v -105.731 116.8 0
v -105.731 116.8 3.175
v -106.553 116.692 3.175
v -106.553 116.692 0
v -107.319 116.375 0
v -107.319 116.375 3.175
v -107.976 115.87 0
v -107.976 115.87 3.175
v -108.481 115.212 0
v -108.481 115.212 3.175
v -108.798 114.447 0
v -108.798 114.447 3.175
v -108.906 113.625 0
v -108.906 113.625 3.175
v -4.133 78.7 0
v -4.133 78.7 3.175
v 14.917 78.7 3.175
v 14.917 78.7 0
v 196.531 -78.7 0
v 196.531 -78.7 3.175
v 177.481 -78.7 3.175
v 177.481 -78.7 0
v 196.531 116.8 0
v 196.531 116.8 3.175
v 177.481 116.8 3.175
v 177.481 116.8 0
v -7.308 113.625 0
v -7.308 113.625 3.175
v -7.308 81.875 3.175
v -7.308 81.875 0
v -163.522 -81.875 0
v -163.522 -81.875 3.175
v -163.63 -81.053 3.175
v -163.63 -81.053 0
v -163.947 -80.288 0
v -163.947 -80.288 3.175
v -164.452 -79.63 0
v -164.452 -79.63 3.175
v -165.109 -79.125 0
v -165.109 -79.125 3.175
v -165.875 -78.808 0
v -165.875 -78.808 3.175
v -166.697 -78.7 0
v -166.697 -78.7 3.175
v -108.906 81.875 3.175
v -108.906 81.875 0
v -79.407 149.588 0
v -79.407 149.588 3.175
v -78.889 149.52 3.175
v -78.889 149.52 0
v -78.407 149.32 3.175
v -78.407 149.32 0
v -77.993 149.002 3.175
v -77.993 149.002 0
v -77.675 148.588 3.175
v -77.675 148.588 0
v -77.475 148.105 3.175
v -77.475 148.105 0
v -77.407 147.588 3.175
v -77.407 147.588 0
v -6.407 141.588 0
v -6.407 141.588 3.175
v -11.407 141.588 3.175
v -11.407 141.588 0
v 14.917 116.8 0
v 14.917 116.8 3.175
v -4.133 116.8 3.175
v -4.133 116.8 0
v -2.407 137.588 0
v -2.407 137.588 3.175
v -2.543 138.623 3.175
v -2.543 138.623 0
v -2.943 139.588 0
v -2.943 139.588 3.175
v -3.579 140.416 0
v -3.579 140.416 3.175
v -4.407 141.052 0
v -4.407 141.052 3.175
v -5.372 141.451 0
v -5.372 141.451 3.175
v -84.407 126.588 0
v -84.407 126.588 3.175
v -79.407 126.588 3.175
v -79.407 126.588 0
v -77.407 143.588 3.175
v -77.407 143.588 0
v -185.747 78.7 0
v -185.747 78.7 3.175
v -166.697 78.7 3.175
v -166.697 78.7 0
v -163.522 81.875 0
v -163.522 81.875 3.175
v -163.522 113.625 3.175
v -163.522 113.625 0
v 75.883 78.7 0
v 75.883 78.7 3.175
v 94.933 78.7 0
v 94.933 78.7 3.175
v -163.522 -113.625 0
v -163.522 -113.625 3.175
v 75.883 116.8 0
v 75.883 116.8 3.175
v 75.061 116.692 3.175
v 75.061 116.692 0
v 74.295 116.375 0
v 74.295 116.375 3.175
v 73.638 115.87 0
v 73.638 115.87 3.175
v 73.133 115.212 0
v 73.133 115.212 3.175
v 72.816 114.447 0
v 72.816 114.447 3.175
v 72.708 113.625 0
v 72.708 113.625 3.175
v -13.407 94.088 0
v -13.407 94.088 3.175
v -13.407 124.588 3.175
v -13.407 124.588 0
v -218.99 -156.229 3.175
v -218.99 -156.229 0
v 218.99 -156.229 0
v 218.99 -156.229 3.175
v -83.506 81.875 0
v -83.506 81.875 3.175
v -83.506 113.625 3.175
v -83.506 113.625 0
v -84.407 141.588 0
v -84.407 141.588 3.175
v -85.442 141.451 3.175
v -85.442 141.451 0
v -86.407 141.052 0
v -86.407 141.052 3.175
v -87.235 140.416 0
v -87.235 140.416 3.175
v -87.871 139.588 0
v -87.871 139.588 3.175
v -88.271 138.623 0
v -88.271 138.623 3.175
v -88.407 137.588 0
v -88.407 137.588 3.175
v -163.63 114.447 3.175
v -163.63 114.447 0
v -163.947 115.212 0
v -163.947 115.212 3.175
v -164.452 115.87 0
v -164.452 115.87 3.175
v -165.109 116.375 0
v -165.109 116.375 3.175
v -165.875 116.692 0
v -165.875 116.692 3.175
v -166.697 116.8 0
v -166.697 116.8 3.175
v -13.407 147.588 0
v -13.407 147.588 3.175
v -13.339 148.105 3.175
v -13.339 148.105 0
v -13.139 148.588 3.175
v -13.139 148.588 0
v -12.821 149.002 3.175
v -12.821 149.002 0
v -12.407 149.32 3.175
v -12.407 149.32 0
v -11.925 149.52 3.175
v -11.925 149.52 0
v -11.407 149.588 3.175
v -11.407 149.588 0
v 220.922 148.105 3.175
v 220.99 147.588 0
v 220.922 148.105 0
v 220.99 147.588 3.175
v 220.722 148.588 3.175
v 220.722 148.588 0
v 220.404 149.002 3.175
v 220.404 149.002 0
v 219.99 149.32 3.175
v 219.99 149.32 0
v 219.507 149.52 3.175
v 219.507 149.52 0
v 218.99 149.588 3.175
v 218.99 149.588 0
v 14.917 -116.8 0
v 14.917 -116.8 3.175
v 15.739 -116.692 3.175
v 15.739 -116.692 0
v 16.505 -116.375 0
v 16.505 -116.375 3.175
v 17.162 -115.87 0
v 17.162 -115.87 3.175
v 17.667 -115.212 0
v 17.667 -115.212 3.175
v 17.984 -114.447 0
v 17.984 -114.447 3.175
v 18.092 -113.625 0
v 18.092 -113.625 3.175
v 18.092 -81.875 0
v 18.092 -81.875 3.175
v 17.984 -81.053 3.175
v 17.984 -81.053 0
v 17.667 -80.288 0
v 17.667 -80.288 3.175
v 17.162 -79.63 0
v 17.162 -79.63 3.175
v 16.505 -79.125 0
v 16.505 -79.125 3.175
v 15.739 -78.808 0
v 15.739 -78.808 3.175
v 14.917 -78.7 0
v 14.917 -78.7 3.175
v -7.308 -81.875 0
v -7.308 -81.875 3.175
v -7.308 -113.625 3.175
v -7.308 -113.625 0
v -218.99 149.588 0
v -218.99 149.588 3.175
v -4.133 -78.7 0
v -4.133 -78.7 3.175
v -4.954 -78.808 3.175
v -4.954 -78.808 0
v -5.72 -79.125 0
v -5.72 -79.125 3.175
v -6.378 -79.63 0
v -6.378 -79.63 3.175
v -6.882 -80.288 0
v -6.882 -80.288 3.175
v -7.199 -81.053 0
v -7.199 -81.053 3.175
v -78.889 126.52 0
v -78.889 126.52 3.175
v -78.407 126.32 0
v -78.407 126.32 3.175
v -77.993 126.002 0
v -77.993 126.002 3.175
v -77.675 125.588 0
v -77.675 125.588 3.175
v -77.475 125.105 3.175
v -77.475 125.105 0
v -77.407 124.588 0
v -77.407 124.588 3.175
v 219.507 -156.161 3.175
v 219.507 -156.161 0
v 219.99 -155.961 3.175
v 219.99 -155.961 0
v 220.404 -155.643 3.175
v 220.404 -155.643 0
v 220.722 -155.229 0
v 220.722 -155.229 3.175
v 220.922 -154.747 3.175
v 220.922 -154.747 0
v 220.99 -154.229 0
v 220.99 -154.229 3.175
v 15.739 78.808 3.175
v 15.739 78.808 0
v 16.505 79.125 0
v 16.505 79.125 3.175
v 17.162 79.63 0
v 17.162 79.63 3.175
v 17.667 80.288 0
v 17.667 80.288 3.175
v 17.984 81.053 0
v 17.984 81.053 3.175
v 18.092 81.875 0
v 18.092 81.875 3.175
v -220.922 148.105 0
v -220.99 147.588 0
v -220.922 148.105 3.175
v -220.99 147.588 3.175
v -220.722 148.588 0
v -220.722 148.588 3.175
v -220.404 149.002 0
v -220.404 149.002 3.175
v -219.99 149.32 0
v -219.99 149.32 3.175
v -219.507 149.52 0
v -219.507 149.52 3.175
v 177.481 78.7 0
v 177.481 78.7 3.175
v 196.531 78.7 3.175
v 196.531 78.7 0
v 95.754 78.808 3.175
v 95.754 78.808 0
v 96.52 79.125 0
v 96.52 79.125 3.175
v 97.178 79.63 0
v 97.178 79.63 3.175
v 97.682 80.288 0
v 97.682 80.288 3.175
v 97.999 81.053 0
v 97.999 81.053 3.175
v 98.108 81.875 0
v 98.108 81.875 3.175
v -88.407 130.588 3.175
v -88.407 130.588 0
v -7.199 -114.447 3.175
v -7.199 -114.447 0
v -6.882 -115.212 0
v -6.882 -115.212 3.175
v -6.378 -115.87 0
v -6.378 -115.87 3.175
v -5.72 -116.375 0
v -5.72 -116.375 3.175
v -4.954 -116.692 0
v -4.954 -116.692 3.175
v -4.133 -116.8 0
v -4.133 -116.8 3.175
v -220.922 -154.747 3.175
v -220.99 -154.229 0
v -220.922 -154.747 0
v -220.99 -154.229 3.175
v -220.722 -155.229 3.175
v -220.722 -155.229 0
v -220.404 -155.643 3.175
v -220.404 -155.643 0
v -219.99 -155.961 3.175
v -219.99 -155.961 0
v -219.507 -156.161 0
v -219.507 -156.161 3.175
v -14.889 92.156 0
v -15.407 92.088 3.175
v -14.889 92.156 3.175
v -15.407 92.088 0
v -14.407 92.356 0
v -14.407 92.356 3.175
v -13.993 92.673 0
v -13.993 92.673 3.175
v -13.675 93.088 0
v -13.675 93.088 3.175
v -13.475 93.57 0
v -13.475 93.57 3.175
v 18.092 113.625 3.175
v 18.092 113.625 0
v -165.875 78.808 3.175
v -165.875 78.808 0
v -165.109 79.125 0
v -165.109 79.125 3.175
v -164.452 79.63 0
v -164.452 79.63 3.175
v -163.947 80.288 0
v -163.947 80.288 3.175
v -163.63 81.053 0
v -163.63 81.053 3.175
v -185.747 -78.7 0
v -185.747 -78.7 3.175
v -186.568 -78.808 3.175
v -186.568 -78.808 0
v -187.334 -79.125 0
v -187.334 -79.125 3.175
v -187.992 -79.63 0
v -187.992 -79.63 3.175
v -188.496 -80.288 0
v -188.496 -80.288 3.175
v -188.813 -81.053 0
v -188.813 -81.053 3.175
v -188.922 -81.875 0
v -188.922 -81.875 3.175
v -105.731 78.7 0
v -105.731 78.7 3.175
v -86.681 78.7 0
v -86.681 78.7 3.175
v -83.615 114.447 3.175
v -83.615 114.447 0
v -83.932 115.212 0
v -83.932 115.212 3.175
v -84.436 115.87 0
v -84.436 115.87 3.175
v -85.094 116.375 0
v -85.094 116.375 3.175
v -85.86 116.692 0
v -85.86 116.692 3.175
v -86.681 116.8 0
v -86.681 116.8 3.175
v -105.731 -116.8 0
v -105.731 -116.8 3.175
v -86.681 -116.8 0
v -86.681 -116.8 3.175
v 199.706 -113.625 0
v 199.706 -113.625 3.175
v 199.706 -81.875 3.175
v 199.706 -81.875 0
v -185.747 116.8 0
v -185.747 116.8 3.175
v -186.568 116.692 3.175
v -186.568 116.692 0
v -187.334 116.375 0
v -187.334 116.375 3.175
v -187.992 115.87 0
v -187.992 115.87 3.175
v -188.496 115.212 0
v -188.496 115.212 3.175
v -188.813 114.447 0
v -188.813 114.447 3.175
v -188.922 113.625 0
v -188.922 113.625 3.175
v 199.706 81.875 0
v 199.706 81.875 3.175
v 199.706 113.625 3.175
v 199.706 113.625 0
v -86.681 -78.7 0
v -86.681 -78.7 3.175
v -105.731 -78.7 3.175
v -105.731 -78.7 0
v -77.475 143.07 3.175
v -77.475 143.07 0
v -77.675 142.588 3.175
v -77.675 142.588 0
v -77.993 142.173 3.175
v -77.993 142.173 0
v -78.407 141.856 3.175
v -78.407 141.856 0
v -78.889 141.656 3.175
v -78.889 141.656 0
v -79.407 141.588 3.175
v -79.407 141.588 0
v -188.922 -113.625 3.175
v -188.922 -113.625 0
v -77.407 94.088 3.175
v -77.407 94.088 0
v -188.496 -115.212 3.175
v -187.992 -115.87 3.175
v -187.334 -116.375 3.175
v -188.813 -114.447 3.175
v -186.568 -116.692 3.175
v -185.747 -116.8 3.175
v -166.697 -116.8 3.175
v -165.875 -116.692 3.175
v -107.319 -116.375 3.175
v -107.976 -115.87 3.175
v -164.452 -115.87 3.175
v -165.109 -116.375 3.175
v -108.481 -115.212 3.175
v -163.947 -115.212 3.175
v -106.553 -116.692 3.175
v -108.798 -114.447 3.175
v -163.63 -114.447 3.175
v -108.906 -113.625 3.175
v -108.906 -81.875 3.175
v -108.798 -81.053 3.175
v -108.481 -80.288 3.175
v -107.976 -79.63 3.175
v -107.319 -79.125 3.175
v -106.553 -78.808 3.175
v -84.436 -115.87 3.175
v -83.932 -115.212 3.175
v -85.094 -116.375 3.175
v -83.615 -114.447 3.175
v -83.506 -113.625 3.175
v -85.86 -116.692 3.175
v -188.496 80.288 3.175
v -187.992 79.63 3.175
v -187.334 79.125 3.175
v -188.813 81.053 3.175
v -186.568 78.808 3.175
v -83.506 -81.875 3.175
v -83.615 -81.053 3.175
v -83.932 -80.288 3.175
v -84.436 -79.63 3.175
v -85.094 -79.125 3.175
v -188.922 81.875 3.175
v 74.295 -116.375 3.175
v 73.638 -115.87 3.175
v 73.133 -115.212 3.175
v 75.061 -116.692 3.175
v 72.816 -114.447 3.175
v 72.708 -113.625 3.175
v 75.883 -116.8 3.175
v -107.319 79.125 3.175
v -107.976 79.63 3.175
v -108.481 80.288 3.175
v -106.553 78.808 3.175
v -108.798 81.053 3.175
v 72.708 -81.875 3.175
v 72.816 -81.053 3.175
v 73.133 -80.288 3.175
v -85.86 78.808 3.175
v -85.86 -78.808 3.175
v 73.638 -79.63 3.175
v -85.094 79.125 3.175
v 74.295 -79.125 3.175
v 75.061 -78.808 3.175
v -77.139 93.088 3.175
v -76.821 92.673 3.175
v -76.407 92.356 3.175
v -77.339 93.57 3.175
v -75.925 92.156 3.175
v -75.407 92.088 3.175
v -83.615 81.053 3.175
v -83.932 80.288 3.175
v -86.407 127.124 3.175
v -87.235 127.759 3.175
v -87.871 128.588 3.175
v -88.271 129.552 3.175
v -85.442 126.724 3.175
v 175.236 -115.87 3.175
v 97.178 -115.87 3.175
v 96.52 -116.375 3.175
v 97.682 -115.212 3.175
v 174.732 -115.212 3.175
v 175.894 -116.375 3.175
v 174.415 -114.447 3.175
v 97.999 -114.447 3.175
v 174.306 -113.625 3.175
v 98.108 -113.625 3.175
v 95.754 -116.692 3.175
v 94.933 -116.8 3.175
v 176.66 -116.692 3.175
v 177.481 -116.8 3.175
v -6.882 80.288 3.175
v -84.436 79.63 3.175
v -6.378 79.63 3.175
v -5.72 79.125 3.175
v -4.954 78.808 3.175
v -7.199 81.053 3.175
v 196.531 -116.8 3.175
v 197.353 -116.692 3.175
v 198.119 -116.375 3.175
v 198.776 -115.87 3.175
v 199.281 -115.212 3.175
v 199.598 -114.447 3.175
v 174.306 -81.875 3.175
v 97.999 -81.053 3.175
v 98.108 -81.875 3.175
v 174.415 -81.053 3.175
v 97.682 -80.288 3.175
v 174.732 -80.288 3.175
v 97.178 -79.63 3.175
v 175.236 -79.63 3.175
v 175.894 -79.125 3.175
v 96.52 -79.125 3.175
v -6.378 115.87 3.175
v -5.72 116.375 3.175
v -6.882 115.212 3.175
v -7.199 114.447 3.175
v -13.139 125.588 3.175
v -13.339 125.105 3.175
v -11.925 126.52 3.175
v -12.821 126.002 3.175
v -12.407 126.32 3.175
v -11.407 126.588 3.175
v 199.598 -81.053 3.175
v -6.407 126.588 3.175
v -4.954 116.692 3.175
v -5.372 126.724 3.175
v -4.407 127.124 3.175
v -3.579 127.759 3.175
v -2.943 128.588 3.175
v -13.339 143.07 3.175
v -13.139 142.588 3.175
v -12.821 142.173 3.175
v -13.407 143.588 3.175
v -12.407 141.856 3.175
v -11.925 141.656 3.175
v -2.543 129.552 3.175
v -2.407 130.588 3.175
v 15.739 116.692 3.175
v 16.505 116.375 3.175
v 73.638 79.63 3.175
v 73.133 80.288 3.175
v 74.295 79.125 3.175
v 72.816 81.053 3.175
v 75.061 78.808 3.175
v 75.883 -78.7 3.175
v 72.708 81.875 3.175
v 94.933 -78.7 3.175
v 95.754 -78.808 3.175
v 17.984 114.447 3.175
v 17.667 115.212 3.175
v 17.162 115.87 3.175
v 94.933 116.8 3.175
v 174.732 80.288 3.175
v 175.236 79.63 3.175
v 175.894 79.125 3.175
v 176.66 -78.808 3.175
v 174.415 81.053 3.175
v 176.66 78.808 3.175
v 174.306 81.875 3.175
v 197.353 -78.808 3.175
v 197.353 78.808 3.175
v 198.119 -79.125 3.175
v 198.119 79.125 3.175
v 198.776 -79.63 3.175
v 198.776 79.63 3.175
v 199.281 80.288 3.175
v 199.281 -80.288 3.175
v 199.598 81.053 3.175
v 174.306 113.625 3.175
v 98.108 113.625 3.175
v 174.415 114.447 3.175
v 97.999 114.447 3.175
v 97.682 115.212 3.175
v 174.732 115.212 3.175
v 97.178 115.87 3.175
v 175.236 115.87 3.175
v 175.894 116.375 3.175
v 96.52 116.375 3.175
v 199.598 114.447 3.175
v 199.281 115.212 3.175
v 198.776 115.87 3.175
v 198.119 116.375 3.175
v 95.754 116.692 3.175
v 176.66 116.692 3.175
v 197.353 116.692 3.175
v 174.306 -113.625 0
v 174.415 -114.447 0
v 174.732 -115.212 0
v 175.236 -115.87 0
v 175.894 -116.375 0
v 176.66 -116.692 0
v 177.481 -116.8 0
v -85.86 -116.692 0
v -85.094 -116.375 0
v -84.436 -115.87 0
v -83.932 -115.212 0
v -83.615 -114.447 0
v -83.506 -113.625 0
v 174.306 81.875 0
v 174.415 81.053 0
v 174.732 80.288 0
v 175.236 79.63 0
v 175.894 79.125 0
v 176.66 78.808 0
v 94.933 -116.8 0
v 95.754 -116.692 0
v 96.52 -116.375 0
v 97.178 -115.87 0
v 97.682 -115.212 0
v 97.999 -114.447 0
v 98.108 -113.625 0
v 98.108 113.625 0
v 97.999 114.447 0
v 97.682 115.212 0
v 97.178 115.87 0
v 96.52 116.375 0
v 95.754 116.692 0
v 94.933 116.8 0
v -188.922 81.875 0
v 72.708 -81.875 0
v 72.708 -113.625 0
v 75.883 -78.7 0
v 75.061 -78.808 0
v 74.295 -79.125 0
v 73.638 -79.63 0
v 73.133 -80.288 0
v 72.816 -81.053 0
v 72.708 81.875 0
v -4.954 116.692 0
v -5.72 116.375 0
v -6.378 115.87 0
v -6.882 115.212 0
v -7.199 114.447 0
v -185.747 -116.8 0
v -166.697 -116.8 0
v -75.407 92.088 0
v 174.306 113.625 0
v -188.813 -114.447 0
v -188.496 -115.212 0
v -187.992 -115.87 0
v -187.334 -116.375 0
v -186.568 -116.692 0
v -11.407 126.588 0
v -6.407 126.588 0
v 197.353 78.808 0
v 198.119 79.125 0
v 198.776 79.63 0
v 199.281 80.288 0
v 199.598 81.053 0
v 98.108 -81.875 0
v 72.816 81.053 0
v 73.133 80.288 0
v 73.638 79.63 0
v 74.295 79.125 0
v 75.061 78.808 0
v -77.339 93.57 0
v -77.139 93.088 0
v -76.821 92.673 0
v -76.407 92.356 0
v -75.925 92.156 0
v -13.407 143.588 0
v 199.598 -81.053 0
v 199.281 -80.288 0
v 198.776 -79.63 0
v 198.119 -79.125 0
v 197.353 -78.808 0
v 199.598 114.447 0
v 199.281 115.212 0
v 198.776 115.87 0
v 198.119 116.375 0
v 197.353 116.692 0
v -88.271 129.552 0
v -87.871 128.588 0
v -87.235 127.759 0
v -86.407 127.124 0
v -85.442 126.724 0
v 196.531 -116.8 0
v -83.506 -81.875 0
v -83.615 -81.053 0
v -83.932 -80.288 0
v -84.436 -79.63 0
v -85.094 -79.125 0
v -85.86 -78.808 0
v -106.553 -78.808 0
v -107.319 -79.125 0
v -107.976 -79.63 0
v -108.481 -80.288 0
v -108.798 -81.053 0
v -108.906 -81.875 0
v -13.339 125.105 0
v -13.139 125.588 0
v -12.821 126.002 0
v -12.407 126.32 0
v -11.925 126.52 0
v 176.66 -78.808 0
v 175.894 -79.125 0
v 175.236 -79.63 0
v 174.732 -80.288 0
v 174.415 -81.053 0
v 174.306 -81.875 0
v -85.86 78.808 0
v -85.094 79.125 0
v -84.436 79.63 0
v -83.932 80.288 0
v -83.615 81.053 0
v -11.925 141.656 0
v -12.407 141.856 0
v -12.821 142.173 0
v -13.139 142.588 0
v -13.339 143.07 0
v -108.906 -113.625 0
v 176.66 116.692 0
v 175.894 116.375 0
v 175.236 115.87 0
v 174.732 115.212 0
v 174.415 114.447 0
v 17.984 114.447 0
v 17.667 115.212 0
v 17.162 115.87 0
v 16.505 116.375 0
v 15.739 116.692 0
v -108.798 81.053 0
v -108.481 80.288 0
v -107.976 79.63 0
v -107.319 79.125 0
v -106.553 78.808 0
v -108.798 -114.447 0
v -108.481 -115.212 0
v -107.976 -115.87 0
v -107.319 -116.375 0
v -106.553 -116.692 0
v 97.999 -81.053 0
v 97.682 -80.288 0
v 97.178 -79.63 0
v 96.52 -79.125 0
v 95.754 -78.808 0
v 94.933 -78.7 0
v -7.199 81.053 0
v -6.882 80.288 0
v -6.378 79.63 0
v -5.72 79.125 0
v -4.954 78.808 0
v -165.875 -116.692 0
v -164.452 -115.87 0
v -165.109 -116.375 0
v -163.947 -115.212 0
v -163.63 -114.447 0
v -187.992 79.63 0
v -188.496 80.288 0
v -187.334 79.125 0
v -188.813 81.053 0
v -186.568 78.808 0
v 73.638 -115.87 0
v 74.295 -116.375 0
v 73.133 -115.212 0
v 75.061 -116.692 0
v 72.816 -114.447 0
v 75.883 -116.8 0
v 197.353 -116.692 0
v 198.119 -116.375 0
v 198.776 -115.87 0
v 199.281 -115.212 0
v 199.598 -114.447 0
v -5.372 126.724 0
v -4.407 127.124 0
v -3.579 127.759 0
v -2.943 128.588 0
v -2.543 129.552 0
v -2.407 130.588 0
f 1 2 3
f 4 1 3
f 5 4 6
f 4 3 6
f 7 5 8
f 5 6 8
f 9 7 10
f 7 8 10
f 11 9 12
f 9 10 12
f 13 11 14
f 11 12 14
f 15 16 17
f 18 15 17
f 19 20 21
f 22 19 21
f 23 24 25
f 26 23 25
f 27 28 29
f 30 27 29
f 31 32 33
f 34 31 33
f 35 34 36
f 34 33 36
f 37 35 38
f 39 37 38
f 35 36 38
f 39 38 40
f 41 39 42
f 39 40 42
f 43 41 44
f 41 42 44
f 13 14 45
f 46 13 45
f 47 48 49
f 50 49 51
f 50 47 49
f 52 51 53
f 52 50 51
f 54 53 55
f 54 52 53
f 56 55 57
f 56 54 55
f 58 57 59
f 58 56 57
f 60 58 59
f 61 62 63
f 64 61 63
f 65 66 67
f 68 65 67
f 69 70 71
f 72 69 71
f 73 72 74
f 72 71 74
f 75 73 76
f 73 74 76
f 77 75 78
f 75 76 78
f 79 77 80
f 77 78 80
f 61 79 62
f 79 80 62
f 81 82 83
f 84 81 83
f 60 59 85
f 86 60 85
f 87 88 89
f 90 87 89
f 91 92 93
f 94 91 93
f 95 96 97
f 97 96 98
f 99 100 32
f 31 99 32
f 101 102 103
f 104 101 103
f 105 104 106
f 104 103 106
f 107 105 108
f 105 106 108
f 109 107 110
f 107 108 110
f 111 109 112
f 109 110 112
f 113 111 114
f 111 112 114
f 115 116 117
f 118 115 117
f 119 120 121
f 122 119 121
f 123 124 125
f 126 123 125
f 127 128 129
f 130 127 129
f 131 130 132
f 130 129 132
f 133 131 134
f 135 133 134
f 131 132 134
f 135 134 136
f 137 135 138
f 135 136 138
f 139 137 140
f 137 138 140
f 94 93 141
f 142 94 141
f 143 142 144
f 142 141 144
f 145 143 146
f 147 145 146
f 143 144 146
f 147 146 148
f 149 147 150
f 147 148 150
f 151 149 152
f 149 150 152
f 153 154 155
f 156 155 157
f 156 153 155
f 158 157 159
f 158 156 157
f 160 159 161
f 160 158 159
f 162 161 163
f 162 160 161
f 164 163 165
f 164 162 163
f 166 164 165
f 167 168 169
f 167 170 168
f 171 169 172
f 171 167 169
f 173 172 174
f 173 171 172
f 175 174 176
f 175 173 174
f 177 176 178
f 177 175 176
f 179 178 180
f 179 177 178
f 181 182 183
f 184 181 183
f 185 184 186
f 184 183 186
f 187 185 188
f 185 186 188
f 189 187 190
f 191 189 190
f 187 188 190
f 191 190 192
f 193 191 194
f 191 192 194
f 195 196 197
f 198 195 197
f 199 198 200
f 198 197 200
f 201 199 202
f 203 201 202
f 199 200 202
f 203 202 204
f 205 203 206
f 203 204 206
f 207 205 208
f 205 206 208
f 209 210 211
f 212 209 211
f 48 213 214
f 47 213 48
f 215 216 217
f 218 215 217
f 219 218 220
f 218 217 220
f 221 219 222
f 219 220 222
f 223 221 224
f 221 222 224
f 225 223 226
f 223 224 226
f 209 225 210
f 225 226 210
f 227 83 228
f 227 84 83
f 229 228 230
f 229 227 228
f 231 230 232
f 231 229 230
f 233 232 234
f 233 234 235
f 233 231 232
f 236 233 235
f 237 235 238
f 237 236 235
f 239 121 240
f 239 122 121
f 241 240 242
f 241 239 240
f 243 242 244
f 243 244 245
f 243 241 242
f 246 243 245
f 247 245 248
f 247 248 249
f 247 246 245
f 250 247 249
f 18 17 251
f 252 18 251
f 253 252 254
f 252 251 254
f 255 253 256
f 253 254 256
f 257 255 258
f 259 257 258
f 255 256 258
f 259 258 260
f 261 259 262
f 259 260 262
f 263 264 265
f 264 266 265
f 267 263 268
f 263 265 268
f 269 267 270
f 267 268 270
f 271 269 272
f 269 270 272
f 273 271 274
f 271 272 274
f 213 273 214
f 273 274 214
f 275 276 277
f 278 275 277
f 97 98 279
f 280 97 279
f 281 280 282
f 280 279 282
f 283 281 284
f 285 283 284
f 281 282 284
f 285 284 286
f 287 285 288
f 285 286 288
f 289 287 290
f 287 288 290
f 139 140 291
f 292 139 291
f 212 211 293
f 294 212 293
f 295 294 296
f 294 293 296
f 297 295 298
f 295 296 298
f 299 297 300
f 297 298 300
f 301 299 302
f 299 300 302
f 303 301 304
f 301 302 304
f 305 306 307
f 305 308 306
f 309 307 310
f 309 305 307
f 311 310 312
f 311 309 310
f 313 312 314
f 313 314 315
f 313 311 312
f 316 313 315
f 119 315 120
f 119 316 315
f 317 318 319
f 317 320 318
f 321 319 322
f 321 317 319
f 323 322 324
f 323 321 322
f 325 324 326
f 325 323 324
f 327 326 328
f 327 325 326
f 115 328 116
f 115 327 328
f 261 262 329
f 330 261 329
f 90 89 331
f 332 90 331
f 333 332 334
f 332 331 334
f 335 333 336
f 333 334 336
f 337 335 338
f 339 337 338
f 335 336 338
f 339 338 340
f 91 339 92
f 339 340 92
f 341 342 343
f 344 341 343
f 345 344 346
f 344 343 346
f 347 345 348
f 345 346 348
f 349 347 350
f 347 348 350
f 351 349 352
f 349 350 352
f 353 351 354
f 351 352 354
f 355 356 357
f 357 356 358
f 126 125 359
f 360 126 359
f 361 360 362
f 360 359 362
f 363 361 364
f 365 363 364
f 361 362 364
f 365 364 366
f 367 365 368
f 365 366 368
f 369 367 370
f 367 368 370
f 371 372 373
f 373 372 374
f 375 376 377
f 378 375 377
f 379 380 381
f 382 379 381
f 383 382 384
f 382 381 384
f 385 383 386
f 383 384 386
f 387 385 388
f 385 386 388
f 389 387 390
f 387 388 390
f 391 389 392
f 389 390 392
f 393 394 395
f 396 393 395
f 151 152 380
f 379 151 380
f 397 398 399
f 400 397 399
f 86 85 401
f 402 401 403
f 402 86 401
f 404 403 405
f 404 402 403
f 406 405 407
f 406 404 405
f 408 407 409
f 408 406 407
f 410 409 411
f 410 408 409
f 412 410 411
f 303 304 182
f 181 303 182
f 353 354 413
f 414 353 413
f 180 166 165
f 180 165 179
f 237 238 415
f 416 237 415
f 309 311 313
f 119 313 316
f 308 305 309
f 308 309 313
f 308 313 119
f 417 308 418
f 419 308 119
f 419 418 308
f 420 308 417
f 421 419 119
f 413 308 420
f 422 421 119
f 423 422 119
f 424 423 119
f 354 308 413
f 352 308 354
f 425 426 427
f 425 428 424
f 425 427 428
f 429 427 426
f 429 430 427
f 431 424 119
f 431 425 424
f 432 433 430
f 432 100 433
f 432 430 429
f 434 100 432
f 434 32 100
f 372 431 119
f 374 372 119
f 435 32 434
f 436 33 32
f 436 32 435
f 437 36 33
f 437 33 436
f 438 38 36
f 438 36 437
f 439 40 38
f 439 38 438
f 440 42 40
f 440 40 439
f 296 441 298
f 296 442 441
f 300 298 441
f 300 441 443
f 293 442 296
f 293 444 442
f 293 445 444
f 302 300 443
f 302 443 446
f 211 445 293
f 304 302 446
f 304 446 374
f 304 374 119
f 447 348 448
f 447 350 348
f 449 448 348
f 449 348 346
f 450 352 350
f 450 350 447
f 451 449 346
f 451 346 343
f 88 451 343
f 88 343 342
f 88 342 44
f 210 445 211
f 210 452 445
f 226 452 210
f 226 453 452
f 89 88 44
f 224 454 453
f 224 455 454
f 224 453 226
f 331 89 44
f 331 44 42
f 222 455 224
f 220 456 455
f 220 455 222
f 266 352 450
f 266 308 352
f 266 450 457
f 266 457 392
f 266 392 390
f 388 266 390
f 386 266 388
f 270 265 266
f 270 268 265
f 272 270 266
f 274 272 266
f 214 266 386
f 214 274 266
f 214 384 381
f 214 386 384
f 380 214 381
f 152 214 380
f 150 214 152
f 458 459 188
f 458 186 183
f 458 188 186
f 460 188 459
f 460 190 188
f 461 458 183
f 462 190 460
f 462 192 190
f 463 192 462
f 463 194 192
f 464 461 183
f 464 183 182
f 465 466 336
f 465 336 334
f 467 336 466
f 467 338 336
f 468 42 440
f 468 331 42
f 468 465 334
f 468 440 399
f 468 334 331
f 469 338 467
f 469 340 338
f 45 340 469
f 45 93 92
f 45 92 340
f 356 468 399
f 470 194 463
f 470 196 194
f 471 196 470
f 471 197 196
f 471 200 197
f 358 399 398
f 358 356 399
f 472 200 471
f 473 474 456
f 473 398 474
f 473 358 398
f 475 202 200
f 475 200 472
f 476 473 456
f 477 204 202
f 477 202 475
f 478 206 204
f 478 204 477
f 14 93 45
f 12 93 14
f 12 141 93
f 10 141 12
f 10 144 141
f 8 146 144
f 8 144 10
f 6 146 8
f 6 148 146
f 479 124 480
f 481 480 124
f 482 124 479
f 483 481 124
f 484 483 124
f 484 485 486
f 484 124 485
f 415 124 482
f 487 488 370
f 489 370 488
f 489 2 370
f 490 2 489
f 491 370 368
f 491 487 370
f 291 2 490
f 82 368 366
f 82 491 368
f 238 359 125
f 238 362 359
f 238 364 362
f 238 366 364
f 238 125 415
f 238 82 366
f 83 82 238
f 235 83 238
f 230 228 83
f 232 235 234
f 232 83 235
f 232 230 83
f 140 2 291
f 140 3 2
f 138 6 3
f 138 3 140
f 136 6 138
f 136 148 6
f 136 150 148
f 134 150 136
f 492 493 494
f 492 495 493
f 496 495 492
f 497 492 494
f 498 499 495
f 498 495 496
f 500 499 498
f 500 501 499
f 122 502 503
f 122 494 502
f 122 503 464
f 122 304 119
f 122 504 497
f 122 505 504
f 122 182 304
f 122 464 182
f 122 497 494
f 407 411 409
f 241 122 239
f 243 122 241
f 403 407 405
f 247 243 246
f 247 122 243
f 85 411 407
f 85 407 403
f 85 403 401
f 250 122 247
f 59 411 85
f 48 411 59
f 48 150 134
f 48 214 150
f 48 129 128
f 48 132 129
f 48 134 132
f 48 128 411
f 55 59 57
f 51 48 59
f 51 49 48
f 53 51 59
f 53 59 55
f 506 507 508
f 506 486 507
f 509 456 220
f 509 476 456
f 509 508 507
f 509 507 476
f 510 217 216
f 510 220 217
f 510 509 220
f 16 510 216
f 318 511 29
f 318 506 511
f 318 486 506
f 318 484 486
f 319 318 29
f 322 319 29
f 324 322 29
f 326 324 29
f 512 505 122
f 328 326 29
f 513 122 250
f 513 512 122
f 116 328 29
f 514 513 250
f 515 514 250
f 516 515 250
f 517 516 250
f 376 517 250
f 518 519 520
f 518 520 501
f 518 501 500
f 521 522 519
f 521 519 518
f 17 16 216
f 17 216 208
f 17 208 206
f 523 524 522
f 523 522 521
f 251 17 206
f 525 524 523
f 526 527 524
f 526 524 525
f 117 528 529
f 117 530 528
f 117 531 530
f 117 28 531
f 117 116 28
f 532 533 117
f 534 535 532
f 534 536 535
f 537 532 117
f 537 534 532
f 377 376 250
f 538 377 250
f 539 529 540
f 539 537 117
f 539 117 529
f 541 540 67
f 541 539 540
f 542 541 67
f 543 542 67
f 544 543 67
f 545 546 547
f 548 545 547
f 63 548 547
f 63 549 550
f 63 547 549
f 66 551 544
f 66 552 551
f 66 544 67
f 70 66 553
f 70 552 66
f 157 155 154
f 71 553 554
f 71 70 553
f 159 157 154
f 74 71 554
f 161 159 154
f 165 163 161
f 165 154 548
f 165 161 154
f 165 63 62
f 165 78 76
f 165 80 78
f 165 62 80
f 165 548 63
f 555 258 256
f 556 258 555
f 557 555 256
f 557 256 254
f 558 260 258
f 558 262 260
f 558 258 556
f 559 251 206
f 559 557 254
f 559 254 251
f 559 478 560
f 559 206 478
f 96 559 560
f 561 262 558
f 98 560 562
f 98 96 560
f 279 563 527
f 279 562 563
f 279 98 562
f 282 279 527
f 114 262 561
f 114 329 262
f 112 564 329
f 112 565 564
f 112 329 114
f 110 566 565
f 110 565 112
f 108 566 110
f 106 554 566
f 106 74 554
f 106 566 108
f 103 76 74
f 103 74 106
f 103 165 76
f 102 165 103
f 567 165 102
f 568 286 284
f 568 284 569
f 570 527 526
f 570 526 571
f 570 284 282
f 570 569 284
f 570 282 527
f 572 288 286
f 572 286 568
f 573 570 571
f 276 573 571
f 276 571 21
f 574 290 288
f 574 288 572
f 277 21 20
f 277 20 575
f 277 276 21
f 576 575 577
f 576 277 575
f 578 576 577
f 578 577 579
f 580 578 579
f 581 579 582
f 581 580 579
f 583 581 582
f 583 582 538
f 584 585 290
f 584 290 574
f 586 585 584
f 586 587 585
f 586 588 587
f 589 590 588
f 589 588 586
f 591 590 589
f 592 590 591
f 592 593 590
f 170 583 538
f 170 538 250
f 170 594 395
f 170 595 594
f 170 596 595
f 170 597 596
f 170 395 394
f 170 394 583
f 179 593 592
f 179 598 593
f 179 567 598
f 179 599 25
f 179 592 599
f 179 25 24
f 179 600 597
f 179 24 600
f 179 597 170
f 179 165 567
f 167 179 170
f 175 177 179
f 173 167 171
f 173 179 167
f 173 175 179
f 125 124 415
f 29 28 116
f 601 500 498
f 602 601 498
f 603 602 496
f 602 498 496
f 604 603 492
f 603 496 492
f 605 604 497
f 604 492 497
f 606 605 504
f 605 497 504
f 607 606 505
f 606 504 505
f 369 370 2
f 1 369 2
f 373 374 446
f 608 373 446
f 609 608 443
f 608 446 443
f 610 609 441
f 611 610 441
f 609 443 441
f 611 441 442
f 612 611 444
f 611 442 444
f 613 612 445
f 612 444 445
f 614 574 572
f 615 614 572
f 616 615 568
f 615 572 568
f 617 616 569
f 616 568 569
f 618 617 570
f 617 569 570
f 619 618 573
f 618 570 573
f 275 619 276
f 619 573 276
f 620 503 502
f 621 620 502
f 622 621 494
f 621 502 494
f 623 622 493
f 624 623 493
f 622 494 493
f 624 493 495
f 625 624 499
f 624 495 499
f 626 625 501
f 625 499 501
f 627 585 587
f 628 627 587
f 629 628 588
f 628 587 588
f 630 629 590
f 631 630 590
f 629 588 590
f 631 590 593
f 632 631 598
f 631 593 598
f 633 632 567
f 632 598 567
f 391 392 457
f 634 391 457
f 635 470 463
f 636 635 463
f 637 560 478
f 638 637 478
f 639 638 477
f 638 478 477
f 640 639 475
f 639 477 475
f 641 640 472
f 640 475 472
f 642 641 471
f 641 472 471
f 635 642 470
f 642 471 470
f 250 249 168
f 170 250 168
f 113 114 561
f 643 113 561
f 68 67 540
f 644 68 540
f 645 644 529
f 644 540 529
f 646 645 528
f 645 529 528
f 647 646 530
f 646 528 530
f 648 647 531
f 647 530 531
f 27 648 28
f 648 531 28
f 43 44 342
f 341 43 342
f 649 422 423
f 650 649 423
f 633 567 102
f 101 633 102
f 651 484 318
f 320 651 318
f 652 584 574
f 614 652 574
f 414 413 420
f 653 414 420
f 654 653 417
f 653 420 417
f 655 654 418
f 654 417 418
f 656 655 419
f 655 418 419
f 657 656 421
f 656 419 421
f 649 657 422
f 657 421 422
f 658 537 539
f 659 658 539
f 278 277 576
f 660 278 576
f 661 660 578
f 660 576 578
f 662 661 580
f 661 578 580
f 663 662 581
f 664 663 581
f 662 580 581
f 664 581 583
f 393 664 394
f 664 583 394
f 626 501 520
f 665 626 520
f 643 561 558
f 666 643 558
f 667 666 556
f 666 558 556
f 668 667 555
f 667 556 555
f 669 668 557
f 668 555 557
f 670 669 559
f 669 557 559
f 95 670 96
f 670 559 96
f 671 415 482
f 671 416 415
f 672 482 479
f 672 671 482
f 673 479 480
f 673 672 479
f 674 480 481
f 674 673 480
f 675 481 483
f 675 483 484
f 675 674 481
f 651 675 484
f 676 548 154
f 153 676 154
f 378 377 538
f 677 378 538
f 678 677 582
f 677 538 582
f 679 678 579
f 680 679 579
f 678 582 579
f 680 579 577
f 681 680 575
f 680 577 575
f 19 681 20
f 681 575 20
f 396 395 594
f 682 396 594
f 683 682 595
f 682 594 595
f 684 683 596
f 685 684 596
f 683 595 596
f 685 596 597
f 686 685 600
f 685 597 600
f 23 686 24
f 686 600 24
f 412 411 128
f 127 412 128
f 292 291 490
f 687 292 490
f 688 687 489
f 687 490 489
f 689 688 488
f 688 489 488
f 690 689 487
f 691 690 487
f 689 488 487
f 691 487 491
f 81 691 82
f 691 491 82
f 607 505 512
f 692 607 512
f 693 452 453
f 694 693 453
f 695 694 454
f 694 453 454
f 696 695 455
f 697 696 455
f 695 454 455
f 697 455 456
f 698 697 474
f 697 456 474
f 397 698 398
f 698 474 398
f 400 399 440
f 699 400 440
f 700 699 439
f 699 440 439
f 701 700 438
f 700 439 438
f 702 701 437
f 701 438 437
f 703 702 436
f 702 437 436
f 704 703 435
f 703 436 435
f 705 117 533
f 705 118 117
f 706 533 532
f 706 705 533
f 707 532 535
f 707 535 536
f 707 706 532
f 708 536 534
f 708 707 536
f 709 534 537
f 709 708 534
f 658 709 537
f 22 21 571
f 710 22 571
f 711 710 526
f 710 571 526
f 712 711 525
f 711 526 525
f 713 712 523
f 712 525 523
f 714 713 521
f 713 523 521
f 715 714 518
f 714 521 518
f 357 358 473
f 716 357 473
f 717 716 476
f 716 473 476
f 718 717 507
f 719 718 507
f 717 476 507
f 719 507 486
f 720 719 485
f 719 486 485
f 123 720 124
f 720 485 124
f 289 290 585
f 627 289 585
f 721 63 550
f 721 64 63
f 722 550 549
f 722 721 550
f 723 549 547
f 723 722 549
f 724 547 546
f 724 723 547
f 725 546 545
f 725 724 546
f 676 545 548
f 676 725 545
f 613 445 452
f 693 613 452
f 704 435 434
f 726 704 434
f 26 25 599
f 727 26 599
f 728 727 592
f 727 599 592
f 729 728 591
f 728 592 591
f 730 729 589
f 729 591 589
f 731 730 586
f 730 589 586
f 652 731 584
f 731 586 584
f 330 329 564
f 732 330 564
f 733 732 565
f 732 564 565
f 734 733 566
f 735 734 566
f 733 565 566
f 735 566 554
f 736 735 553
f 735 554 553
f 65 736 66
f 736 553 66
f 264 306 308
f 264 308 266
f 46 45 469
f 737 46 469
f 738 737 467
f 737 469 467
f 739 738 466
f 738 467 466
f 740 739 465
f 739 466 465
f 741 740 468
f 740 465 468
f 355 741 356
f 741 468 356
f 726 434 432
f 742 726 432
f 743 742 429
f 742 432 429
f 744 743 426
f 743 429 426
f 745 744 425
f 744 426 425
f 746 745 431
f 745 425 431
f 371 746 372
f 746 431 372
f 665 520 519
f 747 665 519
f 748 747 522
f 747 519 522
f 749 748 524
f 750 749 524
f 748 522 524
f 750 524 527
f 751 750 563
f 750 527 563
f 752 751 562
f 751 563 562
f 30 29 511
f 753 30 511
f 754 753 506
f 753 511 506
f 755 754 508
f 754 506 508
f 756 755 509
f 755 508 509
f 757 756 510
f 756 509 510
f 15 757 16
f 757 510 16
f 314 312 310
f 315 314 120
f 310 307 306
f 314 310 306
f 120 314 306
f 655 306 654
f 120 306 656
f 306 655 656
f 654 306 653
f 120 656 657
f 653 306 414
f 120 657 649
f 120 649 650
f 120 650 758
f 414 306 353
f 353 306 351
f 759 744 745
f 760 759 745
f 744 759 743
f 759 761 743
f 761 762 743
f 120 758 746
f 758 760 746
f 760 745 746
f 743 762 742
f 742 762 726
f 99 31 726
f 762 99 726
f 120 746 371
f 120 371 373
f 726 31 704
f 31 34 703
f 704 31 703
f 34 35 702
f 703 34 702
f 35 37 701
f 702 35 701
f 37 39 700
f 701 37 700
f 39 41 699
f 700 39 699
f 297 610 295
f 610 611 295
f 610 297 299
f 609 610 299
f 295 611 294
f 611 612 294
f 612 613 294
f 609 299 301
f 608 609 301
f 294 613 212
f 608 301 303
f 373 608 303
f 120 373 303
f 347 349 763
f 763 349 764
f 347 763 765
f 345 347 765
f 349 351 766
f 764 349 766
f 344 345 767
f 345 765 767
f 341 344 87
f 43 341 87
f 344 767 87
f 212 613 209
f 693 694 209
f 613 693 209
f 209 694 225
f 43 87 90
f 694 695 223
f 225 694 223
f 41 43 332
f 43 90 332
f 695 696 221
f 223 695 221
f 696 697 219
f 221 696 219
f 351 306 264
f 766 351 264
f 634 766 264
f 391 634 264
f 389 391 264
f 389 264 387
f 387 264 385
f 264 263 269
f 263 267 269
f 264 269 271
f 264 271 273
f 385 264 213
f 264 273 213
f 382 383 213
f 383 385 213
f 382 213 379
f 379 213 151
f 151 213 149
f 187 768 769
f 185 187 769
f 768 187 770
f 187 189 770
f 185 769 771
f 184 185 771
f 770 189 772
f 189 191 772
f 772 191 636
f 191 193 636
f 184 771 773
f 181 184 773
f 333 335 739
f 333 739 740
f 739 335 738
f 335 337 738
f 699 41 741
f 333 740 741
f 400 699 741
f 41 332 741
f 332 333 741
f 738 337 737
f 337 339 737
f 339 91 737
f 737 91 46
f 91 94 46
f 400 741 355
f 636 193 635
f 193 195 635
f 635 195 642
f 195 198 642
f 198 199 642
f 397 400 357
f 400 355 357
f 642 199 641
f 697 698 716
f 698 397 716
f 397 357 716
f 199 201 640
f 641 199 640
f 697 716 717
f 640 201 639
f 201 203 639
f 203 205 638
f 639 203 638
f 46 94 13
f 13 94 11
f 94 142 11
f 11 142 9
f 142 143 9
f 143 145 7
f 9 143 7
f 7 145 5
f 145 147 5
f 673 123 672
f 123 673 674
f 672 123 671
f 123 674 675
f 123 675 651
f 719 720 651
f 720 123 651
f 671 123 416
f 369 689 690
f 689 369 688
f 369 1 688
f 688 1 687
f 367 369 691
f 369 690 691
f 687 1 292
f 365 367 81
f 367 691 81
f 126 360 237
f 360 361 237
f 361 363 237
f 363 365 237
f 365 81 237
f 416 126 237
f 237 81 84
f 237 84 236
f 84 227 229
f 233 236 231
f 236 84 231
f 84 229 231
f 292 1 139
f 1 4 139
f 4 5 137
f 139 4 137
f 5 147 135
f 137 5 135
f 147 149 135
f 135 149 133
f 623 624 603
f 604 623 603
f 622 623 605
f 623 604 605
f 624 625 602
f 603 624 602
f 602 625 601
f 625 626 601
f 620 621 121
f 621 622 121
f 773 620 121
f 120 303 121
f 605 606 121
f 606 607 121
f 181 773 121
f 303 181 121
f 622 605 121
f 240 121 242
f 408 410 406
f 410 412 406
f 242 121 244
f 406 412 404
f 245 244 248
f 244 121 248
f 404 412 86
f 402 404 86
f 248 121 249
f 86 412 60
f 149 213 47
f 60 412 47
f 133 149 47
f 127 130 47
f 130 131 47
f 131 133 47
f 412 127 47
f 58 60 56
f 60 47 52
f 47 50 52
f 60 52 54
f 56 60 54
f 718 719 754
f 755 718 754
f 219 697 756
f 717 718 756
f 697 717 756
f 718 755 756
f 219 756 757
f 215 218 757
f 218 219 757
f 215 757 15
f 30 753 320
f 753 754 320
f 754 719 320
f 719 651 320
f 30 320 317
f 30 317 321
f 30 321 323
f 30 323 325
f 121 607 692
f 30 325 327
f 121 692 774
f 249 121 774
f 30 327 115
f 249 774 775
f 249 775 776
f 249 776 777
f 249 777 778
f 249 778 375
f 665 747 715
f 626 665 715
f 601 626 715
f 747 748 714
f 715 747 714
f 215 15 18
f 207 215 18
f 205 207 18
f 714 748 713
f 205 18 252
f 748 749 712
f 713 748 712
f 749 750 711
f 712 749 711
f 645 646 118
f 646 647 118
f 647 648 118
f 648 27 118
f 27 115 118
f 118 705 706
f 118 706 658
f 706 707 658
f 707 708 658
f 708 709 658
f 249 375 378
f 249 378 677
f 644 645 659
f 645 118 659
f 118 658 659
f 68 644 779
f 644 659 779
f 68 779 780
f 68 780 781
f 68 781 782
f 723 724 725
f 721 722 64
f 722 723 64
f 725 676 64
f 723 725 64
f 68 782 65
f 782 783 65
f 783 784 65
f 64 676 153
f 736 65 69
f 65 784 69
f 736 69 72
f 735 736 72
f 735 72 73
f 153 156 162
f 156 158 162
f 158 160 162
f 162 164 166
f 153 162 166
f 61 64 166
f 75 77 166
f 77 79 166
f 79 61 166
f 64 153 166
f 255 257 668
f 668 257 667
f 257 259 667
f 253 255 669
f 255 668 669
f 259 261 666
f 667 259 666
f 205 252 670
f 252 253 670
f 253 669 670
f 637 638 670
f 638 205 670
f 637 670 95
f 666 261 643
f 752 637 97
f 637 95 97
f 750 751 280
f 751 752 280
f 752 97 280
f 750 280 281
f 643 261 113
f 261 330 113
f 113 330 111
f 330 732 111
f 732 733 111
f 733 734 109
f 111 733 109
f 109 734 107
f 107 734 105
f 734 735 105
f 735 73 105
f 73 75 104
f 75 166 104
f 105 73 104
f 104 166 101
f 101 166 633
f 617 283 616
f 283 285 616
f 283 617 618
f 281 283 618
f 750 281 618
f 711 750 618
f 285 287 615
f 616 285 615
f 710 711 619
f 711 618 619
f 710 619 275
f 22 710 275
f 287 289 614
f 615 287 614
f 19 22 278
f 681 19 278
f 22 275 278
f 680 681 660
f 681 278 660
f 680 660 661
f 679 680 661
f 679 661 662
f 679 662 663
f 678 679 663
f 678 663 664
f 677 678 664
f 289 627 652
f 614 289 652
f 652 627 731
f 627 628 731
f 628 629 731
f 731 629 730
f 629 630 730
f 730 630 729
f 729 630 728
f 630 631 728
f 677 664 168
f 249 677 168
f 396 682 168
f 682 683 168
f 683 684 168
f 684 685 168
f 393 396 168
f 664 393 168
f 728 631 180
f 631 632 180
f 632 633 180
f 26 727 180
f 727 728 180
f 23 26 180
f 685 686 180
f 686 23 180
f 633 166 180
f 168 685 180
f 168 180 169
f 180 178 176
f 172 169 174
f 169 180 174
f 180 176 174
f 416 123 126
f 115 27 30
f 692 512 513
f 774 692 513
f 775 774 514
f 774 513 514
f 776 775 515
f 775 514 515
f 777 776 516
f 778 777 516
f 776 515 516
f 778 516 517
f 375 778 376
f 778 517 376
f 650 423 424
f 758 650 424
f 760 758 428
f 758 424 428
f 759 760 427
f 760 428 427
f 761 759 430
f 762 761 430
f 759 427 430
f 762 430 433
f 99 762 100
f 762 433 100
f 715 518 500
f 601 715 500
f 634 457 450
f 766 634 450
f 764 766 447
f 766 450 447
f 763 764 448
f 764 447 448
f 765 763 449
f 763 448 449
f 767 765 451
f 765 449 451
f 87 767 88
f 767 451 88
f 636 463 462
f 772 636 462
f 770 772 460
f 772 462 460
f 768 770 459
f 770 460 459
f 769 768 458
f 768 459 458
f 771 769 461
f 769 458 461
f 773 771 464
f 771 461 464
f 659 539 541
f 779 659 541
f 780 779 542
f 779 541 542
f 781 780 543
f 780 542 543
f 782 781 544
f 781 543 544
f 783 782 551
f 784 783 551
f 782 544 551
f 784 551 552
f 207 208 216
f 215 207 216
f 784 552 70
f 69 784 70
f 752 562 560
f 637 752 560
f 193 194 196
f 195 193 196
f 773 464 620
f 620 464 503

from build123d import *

# Parameters (mm, degrees)
SKETCH1_W           = 441.979400076
SKETCH1_H           = 305.81676
BOSS_EXTRUDE1_DEPTH = 3.175
CUT_EXTRUDE1_DEPTH  = 271.654843319
CUT_EXTRUDE2_DEPTH  = 271.654843319
LPATTERN1_COUNT     = 3
LPATTERN1_PITCH     = 181.613999992
LPATTERN2_COUNT     = 2
LPATTERN2_PITCH     = 181.613999992
CUT_EXTRUDE3_DEPTH  = 271.654843319
FILLET1_R           = 2


with BuildPart() as part:
    # Sketch1 → Boss-Extrude1 (new body)
    with BuildSketch(Plane.XY):
        with Locations((0, -3.32067)):
            Rectangle(SKETCH1_W, SKETCH1_H)
    extrude(amount=BOSS_EXTRUDE1_DEPTH)

    # Sketch2 → Cut-Extrude1 (cut, through all)
    with BuildSketch(Plane.XY.offset(3.175)):
        with BuildLine():
            Line((-185.746625, -116.8), (-166.696625, -116.8))
            ThreePointArc((-166.696625, -116.8), (-164.45156097, -115.87006403), (-163.521625, -113.625))
            Line((-163.521625, -113.625), (-163.521625, -81.875))
            ThreePointArc((-163.521625, -81.875), (-164.45156097, -79.62993597), (-166.696625, -78.7))
            Line((-166.696625, -78.7), (-185.746625, -78.7))
            ThreePointArc((-185.746625, -78.7), (-187.99168903, -79.62993597), (-188.921625, -81.875))
            Line((-188.921625, -81.875), (-188.921625, -113.625))
            ThreePointArc((-188.921625, -113.625), (-187.99168903, -115.87006403), (-185.746625, -116.8))
        make_face()
        with BuildLine():
            Line((-185.746625, 78.7), (-166.696625, 78.7))
            ThreePointArc((-166.696625, 78.7), (-164.45156097, 79.62993597), (-163.521625, 81.875))
            Line((-163.521625, 81.875), (-163.521625, 113.625))
            ThreePointArc((-163.521625, 113.625), (-164.45156097, 115.87006403), (-166.696625, 116.8))
            Line((-166.696625, 116.8), (-185.746625, 116.8))
            ThreePointArc((-185.746625, 116.8), (-187.99168903, 115.87006403), (-188.921625, 113.625))
            Line((-188.921625, 113.625), (-188.921625, 81.875))
            ThreePointArc((-188.921625, 81.875), (-187.99168903, 79.62993597), (-185.746625, 78.7))
        make_face()
    cut_extrude1 = extrude(amount=-CUT_EXTRUDE1_DEPTH, mode=Mode.SUBTRACT)

    # Sketch3 → Cut-Extrude2 (cut, through all)
    with BuildSketch(Plane.XY.offset(3.175)):
        with BuildLine():
            Line((-108.906375, -81.875), (-108.906375, -113.625))
            ThreePointArc((-108.906375, -113.625), (-107.97643903, -115.87006403), (-105.731375, -116.8))
            Line((-105.731375, -116.8), (-86.681375, -116.8))
            ThreePointArc((-86.681375, -116.8), (-84.43631097, -115.87006403), (-83.506375, -113.625))
            Line((-83.506375, -113.625), (-83.506375, -81.875))
            ThreePointArc((-83.506375, -81.875), (-84.43631097, -79.62993597), (-86.681375, -78.7))
            Line((-86.681375, -78.7), (-105.731375, -78.7))
            ThreePointArc((-105.731375, -78.7), (-107.97643903, -79.62993597), (-108.906375, -81.875))
        make_face()
        with BuildLine():
            Line((-83.506375, 81.875), (-83.506375, 113.625))
            ThreePointArc((-83.506375, 113.625), (-84.43631097, 115.87006403), (-86.681375, 116.8))
            Line((-86.681375, 116.8), (-105.731375, 116.8))
            ThreePointArc((-105.731375, 116.8), (-107.97643903, 115.87006403), (-108.906375, 113.625))
            Line((-108.906375, 113.625), (-108.906375, 81.875))
            ThreePointArc((-108.906375, 81.875), (-107.97643903, 79.62993597), (-105.731375, 78.7))
            Line((-105.731375, 78.7), (-86.681375, 78.7))
            ThreePointArc((-86.681375, 78.7), (-84.43631097, 79.62993597), (-83.506375, 81.875))
        make_face()
    cut_extrude2 = extrude(amount=-CUT_EXTRUDE2_DEPTH, mode=Mode.SUBTRACT)

    # LPattern1: Cut-Extrude1 ×3
    with Locations(*[(i * LPATTERN1_PITCH, 0, 0) for i in range(1, LPATTERN1_COUNT)]):
        add(cut_extrude1, mode=Mode.SUBTRACT)

    # LPattern2: Cut-Extrude2 ×2
    with Locations(*[(i * LPATTERN2_PITCH, 0, 0) for i in range(1, LPATTERN2_COUNT)]):
        add(cut_extrude2, mode=Mode.SUBTRACT)

    # Sketch6 → Cut-Extrude3 (cut, through all)
    with BuildSketch(Plane.XY.offset(3.175)):
        with BuildLine():
            Line((-77.407000004, 92.08771), (-13.407000004, 92.08771))
            Line((-13.407000004, 92.08771), (-13.407000004, 126.58771))
            Line((-13.407000004, 126.58771), (-6.407000004, 126.58771))
            ThreePointArc((-6.407000004, 126.58771), (-3.578572879, 127.759282875), (-2.407000004, 130.58771))
            Line((-2.407000004, 130.58771), (-2.407000004, 137.58771))
            ThreePointArc((-2.407000004, 137.58771), (-3.578572879, 140.416137125), (-6.407000004, 141.58771))
            Line((-6.407000004, 141.58771), (-13.407000004, 141.58771))
            Line((-13.407000004, 141.58771), (-13.407000004, 149.58771))
            Line((-13.407000004, 149.58771), (-77.407000004, 149.58771))
            Line((-77.407000004, 149.58771), (-77.407000004, 141.58771))
            Line((-77.407000004, 141.58771), (-84.407000004, 141.58771))
            ThreePointArc((-84.407000004, 141.58771), (-87.235427129, 140.416137125), (-88.407000004, 137.58771))
            Line((-88.407000004, 137.58771), (-88.407000004, 130.58771))
            ThreePointArc((-88.407000004, 130.58771), (-87.235427129, 127.759282875), (-84.407000004, 126.58771))
            Line((-84.407000004, 126.58771), (-77.407000004, 126.58771))
            Line((-77.407000004, 126.58771), (-77.407000004, 92.08771))
        make_face()
    extrude(amount=-CUT_EXTRUDE3_DEPTH, mode=Mode.SUBTRACT)

    # Fillet1
    fillet1_edges = [part.edges().sort_by_distance(p)[0] for p in [
        (-77.407000004, 141.58771, 1.5875),
        (-77.407000004, 149.58771, 1.5875),
        (-13.407000004, 149.58771, 1.5875),
        (-13.407000004, 141.58771, 1.5875),
        (-13.407000004, 126.58771, 1.5875),
        (-13.407000004, 92.08771, 1.5875),
        (-77.407000004, 92.08771, 1.5875),
        (-77.407000004, 126.58771, 1.5875),
        (220.989700038, -156.22905, 1.5875),
        (-220.989700038, -156.22905, 1.5875),
        (-220.989700038, 149.58771, 1.5875),
        (220.989700038, 149.58771, 1.5875),
    ]]
    fillet(fillet1_edges, radius=FILLET1_R)


solid = part.part
